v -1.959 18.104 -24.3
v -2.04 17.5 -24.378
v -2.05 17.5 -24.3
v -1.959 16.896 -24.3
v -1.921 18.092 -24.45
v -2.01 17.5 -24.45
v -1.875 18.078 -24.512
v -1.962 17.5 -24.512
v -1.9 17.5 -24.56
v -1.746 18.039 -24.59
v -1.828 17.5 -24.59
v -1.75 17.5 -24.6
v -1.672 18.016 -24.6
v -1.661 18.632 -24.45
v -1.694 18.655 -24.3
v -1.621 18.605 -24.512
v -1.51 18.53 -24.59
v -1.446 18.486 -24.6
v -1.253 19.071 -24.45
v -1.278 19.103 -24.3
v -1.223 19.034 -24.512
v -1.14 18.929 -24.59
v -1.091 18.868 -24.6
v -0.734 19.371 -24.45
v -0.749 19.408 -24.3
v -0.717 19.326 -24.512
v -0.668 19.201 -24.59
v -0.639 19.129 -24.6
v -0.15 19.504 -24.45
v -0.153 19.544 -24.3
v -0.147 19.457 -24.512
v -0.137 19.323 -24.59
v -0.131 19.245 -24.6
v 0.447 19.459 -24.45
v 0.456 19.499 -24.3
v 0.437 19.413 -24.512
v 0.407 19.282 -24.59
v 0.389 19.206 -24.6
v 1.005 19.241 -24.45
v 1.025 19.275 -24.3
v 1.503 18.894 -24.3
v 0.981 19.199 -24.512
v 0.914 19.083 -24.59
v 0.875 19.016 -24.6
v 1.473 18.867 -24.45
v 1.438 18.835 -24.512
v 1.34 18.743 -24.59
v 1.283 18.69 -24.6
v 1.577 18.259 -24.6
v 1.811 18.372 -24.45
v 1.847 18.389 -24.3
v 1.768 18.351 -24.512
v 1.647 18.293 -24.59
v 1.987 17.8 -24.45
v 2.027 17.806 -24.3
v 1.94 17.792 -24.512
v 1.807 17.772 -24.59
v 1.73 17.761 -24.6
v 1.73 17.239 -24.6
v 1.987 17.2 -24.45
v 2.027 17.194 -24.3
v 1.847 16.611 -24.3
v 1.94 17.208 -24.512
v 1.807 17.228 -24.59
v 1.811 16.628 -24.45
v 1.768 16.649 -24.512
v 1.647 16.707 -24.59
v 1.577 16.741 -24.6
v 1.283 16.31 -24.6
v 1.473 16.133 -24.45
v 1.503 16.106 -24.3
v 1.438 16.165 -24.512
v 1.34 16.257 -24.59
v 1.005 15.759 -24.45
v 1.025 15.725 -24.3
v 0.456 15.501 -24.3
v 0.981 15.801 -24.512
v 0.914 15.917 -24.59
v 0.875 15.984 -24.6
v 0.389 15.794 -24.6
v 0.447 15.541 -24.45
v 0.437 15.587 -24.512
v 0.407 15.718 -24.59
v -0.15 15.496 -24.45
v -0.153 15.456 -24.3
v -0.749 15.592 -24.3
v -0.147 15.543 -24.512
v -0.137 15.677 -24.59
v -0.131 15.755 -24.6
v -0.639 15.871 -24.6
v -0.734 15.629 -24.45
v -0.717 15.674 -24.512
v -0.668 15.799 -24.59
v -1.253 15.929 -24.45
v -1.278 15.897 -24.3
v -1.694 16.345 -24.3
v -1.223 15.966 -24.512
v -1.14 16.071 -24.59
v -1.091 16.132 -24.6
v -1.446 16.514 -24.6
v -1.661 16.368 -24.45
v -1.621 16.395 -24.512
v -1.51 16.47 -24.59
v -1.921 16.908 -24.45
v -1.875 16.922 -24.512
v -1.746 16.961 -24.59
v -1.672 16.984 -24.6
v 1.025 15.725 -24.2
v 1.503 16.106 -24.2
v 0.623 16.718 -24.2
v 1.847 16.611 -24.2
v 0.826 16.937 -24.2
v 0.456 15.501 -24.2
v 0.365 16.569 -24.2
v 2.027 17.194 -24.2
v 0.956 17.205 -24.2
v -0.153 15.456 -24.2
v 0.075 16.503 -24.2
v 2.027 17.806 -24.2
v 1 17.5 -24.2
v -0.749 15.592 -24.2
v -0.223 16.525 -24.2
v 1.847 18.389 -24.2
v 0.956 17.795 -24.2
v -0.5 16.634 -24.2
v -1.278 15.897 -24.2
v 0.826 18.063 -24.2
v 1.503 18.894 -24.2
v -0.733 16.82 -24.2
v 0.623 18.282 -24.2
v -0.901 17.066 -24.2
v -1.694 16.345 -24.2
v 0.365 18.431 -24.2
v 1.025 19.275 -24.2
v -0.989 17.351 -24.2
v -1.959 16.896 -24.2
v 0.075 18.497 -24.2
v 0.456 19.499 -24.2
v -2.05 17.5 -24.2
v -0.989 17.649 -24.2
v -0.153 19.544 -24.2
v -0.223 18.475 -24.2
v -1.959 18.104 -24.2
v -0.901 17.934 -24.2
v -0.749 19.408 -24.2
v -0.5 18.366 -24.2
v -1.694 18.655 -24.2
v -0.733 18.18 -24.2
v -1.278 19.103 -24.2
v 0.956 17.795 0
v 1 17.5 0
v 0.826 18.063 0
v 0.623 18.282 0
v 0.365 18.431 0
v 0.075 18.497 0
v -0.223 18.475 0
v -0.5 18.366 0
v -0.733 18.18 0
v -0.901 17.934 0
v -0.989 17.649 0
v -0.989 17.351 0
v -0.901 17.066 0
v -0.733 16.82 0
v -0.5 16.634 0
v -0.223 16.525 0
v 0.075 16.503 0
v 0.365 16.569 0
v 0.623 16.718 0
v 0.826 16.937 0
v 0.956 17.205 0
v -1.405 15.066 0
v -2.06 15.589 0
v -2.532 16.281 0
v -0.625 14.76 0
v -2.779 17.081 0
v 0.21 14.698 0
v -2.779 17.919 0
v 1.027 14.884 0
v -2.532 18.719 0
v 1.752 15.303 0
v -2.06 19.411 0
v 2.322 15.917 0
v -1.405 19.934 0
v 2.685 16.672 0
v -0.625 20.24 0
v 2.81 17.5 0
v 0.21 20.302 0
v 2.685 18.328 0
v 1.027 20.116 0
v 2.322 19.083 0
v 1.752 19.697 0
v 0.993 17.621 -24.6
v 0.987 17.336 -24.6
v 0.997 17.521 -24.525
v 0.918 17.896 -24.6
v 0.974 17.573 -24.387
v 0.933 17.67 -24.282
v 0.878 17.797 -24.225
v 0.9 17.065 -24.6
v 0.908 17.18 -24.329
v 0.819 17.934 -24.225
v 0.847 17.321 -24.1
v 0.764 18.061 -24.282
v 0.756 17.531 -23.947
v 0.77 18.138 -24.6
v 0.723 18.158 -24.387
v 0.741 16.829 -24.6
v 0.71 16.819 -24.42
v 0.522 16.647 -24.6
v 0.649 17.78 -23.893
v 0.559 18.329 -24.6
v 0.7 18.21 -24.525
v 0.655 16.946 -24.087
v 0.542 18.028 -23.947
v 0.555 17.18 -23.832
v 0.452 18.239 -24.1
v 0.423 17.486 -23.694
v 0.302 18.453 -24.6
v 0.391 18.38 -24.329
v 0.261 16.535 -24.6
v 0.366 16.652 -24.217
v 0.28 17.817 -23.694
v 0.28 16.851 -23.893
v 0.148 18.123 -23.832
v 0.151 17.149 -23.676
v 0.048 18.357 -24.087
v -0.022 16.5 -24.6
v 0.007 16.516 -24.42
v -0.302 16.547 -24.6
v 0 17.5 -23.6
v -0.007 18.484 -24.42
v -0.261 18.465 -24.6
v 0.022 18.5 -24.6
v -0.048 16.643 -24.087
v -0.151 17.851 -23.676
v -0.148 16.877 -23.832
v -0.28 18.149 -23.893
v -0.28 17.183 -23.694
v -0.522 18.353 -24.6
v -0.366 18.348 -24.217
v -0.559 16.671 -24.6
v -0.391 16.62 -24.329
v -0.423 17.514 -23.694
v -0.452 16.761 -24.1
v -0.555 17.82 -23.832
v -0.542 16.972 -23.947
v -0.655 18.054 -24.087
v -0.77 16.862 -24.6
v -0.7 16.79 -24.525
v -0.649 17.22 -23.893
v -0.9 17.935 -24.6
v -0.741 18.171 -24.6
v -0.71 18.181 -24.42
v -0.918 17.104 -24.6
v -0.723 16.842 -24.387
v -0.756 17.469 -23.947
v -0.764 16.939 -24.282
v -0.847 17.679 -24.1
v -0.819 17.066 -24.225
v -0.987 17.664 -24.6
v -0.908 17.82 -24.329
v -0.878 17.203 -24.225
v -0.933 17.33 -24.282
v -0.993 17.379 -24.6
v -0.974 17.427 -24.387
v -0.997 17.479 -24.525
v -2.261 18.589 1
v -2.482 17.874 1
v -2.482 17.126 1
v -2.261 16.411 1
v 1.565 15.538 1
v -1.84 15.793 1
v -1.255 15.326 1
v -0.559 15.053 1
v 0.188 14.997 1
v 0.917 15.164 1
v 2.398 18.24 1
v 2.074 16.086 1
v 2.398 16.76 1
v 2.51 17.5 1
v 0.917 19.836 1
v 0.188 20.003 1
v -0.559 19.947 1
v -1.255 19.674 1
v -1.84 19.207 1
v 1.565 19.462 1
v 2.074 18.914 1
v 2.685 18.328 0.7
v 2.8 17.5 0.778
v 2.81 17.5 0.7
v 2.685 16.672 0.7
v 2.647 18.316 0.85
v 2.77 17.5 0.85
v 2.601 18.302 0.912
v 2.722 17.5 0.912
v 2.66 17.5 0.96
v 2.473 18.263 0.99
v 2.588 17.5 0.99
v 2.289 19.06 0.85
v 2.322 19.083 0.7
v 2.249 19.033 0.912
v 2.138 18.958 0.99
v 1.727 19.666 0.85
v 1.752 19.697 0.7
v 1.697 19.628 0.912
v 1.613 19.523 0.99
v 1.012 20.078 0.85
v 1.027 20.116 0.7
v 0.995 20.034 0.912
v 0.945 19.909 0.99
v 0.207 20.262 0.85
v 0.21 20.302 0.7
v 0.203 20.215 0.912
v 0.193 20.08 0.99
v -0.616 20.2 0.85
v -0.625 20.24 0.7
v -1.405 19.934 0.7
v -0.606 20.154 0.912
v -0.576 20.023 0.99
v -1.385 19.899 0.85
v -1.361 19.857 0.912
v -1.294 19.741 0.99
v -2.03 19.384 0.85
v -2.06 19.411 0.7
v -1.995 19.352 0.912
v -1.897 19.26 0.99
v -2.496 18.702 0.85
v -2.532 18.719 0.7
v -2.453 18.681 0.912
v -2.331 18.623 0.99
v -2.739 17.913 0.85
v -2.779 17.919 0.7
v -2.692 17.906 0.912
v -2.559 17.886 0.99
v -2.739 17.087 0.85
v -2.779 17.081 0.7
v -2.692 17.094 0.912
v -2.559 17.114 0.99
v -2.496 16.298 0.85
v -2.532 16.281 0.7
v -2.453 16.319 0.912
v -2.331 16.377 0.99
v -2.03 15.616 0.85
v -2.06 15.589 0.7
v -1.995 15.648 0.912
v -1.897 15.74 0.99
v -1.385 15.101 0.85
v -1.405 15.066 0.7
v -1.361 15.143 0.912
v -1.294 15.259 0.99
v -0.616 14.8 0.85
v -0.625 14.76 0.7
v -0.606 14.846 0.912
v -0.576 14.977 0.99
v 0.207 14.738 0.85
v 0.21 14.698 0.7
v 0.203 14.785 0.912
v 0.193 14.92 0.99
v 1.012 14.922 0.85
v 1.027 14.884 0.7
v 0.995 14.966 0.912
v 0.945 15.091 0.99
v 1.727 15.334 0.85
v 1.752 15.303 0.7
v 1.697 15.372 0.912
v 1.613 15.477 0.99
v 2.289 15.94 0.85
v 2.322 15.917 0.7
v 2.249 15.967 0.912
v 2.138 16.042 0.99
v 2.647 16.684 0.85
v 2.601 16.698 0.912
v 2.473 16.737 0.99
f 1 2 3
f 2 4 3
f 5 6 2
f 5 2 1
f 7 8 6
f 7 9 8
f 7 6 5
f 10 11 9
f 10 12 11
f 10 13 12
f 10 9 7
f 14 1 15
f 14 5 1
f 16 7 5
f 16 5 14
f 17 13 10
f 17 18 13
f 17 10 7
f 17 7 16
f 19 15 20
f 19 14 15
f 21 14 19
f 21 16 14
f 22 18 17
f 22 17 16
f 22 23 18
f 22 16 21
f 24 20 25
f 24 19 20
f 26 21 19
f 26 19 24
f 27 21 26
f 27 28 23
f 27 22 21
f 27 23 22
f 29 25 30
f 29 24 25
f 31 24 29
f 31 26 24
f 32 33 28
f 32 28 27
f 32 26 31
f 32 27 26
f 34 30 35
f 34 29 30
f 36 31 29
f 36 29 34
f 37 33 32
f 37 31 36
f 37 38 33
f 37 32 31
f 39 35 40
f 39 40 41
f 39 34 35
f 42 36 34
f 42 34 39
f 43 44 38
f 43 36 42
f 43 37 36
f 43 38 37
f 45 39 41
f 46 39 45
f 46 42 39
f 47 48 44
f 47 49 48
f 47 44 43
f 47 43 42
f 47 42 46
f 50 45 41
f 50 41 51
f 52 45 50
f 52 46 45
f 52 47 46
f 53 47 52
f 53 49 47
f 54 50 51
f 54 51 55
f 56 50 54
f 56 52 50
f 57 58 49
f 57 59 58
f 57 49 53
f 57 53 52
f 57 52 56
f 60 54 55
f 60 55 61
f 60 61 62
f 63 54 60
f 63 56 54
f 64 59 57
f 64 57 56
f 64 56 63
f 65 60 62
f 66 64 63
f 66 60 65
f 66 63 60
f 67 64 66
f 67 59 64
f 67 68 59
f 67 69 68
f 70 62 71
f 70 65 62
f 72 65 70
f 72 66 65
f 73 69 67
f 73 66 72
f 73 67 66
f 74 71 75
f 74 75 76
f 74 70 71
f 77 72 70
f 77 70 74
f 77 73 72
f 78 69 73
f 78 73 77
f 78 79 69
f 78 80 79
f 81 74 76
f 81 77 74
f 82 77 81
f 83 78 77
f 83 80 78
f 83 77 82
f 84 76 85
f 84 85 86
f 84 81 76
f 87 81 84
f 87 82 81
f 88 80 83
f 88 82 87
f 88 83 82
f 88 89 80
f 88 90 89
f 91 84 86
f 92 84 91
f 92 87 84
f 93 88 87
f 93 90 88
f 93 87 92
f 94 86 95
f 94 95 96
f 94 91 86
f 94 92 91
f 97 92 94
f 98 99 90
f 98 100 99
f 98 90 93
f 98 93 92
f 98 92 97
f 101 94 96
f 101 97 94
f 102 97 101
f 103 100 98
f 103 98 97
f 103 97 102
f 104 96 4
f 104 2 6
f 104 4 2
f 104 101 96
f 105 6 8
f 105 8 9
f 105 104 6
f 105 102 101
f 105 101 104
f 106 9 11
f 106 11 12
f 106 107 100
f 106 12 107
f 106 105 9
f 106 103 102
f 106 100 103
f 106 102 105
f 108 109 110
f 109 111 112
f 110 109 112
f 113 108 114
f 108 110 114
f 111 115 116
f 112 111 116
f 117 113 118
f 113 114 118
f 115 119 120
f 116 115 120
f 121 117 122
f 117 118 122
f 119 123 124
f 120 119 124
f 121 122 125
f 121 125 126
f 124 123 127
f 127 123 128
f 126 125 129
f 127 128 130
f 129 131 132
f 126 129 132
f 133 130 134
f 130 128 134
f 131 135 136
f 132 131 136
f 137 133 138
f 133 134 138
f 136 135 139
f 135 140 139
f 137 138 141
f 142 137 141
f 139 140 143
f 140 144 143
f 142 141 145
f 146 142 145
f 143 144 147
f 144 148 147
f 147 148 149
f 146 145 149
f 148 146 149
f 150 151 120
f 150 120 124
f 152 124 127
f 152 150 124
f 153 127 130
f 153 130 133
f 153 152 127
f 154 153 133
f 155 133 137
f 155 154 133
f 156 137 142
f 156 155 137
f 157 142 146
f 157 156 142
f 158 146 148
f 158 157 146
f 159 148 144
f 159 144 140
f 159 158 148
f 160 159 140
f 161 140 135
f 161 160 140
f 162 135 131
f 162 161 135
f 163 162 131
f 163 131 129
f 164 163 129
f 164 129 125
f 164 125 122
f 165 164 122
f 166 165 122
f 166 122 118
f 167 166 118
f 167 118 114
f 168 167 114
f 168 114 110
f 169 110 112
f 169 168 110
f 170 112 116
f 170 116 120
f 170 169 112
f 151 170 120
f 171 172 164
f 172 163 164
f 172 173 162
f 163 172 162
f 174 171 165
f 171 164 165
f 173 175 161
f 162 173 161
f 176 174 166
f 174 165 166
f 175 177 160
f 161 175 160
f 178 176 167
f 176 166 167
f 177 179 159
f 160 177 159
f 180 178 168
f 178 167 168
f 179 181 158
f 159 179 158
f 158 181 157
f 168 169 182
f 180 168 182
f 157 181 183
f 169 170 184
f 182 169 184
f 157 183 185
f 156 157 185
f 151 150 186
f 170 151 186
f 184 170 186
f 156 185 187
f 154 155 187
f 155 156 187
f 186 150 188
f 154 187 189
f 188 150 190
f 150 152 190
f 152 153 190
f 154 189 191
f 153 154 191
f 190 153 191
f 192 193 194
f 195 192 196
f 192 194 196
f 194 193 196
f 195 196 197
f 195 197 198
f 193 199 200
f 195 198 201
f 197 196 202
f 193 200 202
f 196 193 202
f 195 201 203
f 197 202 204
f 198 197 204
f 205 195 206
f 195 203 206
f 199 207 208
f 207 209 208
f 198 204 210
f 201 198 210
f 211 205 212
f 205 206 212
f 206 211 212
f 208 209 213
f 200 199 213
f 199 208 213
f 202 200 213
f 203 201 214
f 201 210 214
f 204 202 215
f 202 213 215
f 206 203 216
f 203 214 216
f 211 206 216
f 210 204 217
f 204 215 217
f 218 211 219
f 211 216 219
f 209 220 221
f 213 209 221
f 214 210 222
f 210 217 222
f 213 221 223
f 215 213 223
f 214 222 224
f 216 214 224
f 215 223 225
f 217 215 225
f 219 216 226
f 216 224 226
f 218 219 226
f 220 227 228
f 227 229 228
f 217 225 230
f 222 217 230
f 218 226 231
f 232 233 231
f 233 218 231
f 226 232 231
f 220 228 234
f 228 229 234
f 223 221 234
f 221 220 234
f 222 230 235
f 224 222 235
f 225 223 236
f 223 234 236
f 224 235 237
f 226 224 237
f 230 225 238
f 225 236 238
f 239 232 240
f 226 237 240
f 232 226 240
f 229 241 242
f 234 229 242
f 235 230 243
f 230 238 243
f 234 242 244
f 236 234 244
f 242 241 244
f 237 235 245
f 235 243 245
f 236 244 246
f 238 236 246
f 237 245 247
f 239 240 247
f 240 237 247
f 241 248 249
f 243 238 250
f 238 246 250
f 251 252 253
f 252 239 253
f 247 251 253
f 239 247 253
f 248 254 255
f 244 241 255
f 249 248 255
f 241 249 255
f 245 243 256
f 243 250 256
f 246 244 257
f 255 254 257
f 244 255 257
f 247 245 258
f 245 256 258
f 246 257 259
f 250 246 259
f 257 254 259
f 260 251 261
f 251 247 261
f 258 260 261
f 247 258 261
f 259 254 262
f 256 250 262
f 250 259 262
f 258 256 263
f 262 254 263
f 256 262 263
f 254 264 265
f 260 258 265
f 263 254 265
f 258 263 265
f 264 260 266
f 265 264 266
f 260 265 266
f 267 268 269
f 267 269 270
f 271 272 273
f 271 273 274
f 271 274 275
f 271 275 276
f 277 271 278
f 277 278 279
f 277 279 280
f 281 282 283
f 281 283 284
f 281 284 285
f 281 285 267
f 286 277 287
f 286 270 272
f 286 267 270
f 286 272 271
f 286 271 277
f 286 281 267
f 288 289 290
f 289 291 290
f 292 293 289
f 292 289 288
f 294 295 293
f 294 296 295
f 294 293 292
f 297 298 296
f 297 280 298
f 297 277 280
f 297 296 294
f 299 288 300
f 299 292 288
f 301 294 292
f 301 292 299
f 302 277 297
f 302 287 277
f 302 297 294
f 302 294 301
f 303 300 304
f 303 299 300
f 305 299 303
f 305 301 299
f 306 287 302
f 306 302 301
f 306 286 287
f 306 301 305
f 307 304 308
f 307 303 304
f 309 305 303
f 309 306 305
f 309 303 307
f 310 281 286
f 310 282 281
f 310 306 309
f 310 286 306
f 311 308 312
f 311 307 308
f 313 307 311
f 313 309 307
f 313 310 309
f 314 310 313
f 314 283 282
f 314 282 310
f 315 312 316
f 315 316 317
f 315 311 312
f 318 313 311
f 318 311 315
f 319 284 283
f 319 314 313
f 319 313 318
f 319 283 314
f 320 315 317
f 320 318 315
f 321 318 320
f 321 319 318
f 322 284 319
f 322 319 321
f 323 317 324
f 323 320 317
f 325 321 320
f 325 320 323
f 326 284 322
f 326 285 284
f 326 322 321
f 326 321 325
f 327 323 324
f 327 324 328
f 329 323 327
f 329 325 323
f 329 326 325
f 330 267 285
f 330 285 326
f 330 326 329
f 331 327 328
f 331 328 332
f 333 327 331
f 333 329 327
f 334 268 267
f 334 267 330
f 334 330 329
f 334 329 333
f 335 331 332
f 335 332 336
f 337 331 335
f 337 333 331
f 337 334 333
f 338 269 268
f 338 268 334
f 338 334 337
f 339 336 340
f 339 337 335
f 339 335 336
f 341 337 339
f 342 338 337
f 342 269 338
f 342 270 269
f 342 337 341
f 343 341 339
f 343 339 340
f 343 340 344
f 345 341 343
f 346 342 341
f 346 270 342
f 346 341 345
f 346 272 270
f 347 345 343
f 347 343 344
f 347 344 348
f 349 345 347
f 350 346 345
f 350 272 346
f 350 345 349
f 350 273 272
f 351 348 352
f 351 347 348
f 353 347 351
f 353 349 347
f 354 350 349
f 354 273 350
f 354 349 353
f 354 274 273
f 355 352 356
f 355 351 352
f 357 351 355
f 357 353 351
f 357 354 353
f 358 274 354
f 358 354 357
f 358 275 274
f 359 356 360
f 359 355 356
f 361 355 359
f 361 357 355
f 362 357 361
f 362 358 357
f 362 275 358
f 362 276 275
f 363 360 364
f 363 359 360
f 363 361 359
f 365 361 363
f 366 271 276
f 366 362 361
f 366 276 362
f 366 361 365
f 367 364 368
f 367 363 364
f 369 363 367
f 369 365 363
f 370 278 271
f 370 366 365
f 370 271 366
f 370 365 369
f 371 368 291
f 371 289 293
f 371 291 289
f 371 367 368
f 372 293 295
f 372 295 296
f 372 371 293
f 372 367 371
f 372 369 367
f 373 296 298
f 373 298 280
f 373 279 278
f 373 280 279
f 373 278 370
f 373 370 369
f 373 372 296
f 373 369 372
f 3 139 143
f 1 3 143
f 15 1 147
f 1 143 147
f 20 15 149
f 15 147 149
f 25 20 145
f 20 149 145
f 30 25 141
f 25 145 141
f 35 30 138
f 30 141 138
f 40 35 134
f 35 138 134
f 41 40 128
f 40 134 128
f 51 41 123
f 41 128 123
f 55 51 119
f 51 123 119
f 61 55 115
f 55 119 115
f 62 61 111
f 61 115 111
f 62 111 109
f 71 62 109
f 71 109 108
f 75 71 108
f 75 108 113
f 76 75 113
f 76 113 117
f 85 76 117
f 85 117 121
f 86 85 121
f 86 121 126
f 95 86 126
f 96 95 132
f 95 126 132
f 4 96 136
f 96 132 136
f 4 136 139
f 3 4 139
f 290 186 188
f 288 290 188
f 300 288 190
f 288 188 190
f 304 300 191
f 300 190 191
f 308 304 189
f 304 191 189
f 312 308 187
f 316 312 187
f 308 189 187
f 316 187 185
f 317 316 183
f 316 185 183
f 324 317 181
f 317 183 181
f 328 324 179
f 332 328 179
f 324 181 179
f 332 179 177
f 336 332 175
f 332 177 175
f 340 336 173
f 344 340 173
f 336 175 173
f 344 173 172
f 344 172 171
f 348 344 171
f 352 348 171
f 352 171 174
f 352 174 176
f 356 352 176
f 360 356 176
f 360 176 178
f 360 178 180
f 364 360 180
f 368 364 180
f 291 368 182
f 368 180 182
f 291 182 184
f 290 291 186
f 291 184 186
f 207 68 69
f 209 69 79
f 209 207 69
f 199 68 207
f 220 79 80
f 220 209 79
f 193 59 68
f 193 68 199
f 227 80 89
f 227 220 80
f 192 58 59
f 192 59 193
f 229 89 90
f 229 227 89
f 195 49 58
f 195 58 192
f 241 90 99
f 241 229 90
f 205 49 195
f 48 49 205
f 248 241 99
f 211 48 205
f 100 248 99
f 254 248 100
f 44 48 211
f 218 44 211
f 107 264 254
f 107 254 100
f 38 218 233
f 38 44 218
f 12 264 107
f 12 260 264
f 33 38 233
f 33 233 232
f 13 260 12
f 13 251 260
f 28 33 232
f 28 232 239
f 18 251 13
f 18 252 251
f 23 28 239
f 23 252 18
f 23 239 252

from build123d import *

# Parameters (mm, degrees)
SKETCH1_R           = 1
BASE_EXTRUDE_DEPTH  = 24.2
SKETCH2_R           = 2.81
BOSS_EXTRUDE1_DEPTH = 1
FILLET1_R           = 0.3
SKETCH3_R           = 2.05
BOSS_EXTRUDE2_DEPTH = 0.4
FILLET2_R           = 0.3


with BuildPart() as part:
    # Sketch1 → Base-Extrude (new body)
    with BuildSketch(Plane.XY):
        with Locations((0, 17.5)):
            Circle(SKETCH1_R)
    extrude(amount=-BASE_EXTRUDE_DEPTH)

    # Sketch2 → Boss-Extrude1 (add)
    with BuildSketch(Plane.XY):
        with Locations((0, 17.5)):
            Circle(SKETCH2_R)
    extrude(amount=BOSS_EXTRUDE1_DEPTH)

    # Fillet1
    fillet1_edges = [part.edges().sort_by_distance(p)[0] for p in [
        (-2.81, 17.5, 1),
    ]]
    fillet(fillet1_edges, radius=FILLET1_R)

    # Sketch3 → Boss-Extrude2 (add)
    with BuildSketch(Plane(origin=(0, 0, -24.2), x_dir=(-1, 0, 0), z_dir=(0, 0, -1))):
        with Locations((0, 17.5)):
            Circle(SKETCH3_R)
    extrude(amount=BOSS_EXTRUDE2_DEPTH)

    # Sketch4 → Cut-Revolve1 (revolve, cut)
    with BuildSketch(Plane(origin=(0, 0, -24.6), x_dir=(-1, 0, 0), z_dir=(0, 0, -1))):
        with BuildLine():
            Line((0.918394915, 17.104335014), (-0.918394915, 17.895664986))
            ThreePointArc((-0.918394915, 17.895664986), (-0.395664986, 16.581605085), (0.918394915, 17.104335014))
        make_face()
    revolve(axis=Axis((0.918394915, 17.895664986, -24.6), (-0.918394915, -0.395664986, 0)), mode=Mode.SUBTRACT)

    # Fillet2
    fillet2_edges = [part.edges().sort_by_distance(p)[0] for p in [
        (2.05, 17.5, -24.6),
    ]]
    fillet(fillet2_edges, radius=FILLET2_R)


solid = part.part
